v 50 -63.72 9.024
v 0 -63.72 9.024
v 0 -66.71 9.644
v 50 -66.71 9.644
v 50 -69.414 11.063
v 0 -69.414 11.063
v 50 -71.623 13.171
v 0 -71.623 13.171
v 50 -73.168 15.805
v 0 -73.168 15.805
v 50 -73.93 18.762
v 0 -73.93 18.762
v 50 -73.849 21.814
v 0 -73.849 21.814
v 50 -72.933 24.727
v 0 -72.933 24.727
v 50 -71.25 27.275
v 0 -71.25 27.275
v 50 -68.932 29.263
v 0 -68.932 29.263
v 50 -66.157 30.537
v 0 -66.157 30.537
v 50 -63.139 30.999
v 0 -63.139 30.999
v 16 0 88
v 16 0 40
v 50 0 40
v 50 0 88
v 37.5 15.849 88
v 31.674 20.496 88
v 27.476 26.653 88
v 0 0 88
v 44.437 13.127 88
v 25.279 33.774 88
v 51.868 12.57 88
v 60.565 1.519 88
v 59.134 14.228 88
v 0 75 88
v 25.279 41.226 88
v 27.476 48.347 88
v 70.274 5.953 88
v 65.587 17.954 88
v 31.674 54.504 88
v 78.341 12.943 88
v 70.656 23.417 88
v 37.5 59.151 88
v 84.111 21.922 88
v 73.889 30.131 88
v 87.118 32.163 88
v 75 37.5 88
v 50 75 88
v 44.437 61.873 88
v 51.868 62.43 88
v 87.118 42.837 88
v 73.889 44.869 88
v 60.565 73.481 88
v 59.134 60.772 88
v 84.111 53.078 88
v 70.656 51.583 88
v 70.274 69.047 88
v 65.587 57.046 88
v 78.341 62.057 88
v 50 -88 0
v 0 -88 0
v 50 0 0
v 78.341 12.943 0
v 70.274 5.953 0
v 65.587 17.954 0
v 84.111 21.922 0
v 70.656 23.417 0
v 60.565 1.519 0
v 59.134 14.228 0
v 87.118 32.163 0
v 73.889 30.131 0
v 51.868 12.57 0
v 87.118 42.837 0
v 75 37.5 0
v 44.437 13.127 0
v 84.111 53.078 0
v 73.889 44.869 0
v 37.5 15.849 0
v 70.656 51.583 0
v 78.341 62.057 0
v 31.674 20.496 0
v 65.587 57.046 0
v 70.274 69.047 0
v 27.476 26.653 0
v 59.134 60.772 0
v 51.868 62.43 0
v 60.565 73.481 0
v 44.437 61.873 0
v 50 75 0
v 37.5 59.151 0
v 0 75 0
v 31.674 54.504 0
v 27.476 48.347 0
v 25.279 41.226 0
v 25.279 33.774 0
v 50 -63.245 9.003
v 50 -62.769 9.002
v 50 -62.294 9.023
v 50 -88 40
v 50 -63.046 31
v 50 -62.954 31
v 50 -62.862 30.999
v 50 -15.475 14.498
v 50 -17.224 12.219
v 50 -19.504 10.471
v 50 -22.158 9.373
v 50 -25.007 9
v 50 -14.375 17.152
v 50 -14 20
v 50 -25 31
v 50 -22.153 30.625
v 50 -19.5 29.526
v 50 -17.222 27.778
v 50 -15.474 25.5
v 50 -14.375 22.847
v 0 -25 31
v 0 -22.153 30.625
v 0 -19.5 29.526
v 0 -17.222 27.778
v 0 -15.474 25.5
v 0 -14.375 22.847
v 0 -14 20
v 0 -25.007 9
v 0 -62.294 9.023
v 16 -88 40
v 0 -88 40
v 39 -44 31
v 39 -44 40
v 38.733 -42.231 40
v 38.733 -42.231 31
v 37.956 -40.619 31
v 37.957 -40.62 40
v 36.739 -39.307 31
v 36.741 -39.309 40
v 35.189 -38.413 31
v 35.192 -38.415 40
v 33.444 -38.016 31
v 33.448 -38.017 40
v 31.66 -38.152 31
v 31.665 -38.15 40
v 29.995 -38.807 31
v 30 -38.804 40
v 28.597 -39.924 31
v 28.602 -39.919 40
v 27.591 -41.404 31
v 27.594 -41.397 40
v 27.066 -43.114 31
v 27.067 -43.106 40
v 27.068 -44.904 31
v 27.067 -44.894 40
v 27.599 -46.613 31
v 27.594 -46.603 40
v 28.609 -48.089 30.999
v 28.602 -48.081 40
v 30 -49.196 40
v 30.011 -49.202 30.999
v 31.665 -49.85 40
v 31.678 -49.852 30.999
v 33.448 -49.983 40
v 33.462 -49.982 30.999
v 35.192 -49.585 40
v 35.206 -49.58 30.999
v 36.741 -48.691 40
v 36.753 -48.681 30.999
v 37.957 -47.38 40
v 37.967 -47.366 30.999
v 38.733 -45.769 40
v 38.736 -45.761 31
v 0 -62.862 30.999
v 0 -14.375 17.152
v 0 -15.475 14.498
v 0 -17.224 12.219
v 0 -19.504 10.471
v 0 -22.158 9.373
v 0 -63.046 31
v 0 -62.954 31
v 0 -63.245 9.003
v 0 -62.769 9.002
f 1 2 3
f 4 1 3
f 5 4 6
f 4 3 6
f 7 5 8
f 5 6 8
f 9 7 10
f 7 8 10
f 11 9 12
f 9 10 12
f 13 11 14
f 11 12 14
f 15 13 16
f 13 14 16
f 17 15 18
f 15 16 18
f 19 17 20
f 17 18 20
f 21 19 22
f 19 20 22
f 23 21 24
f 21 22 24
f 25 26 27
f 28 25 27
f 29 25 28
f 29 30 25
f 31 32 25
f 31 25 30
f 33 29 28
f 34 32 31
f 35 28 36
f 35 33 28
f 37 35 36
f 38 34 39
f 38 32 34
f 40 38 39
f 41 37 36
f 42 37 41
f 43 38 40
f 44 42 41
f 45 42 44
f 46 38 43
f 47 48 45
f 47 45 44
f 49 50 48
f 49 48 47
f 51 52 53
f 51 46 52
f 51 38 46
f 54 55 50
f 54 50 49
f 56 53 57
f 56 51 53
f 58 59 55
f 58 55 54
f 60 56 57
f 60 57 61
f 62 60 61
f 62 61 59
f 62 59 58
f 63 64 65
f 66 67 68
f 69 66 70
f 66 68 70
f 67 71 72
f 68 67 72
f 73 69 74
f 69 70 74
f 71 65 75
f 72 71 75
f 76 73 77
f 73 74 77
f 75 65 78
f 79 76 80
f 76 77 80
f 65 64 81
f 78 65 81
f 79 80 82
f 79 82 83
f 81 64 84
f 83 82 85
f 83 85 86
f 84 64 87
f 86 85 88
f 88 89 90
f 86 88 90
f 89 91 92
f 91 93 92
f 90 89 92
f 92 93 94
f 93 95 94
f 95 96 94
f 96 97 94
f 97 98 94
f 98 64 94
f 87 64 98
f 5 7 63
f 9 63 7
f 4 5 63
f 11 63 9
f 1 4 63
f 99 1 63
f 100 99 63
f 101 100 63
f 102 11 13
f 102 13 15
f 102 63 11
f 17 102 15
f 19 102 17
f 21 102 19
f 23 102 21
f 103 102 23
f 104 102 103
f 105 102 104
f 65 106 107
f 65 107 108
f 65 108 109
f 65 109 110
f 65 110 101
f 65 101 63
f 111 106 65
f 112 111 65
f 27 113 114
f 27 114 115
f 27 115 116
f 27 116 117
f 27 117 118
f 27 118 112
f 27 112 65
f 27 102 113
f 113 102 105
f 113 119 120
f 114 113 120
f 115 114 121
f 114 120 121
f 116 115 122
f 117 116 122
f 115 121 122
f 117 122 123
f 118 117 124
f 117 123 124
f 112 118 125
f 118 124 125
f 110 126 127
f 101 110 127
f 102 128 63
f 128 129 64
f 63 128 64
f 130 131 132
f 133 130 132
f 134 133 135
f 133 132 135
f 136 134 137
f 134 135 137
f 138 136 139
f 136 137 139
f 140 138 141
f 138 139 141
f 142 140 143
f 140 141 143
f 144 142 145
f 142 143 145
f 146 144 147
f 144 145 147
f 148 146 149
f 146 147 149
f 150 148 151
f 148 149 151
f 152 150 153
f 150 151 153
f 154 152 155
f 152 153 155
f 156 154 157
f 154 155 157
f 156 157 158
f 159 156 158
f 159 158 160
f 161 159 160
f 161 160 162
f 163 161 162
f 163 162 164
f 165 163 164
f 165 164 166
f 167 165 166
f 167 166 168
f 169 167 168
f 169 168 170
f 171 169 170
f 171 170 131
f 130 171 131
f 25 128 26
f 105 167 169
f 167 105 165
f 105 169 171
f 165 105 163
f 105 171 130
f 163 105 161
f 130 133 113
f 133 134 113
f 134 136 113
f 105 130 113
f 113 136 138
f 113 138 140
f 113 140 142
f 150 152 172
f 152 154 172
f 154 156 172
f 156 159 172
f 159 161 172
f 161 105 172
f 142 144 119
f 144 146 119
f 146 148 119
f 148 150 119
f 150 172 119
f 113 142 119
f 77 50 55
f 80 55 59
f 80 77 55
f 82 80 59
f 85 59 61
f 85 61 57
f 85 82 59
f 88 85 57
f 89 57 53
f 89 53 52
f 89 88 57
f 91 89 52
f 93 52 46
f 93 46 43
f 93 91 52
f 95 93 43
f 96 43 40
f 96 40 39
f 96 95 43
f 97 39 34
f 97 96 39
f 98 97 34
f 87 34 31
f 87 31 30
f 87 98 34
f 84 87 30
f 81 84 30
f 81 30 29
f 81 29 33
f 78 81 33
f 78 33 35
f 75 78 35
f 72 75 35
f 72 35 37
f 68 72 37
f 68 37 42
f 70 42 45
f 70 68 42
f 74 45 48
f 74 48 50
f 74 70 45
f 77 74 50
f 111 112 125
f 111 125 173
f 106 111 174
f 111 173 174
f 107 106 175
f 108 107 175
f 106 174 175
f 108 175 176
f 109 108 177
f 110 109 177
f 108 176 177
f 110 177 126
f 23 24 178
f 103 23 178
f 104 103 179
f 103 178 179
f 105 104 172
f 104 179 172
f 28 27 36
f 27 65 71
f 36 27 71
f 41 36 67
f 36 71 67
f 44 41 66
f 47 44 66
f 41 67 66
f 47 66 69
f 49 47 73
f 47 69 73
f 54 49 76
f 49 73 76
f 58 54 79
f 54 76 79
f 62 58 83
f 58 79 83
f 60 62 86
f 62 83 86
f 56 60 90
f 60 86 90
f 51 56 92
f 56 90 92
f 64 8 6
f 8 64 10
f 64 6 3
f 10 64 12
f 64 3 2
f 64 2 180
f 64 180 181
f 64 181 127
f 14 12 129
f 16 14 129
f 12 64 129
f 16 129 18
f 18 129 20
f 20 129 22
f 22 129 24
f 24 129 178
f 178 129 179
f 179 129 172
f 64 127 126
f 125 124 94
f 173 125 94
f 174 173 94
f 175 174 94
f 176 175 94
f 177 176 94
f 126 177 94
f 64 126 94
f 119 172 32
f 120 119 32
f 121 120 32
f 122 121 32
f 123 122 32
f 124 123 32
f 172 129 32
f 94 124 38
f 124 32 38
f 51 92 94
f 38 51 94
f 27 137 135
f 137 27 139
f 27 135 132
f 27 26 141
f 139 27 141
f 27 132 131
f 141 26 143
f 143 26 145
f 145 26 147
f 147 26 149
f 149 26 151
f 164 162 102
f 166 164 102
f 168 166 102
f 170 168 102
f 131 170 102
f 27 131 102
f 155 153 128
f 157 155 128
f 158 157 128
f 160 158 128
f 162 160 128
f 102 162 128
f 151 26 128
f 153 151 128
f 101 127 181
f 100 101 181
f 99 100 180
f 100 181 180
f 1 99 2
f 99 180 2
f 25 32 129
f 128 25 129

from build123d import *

# Parameters (mm, degrees)
F0_R     = 25
F1_DEPTH = 88
F3_DEPTH = 50
F5_DEPTH = 16
F6_R     = 6
F7_DEPTH = 9.001572688


with BuildPart() as f1:
    # F0 (on Top) → F1 (new body)
    with BuildSketch(Plane.XY):
        with BuildLine():
            Line((0, 75), (0, 0))
            Line((0, 0), (50, 0))
            ThreePointArc((50, 0), (12.5, 37.5), (50, 75))
            Line((50, 75), (0, 75))
        make_face()
        with BuildLine():
            ThreePointArc((50, 75), (12.5, 37.5), (50, 0))
            ThreePointArc((50, 0), (76.5165042945, 10.9834957055), (87.5, 37.5))
            ThreePointArc((87.5, 37.5), (76.5165042945, 64.0165042945), (50, 75))
        make_face()
        with Locations((50, 37.5)):
            Circle(F0_R, mode=Mode.SUBTRACT)
    extrude(amount=F1_DEPTH)

    # F2 (on Right) → F3 (join)
    with BuildSketch(Plane.YZ):
        Polygon((-88, 0), (0, 0), (0, 20), (0, 40), (-88, 40), align=None)
        with BuildLine():
            ThreePointArc((-25.000251984, 30.9999999971), (-17.2219144973, 27.7782636823), (-14, 20))
            ThreePointArc((-14, 20), (-17.2241933288, 12.2194582058), (-25.0066964749, 9.0000020383))
            Line((-25.0066964749, 9.0000020383), (-62.293662929, 9.0227012457))
            ThreePointArc((-62.293662929, 9.0227012457), (-63.0066964749, 9.0000020383), (-63.7197018551, 9.0235693762))
            ThreePointArc((-63.7197018551, 9.0235693762), (-73.9961566797, 20.2907546668), (-63.1386355855, 30.9991263369))
            ThreePointArc((-63.1386355855, 30.9991263369), (-63.000251984, 30.9999999971), (-62.8618683426, 30.999132677))
            Line((-62.8618683426, 30.999132677), (-25.000251984, 30.9999999971))
        make_face(mode=Mode.SUBTRACT)
    extrude(amount=F3_DEPTH)

    # F4 (on Right) → F5 (join)
    with BuildSketch(Plane.YZ):
        Polygon((-88, 40), (0, 40), (0, 88), align=None)
    extrude(amount=F5_DEPTH)

    # F6 (on face) → F7 (cut, through all)
    with BuildSketch(Plane.XY.offset(40)):
        with Locations((33, -44)):
            Circle(F6_R)
    extrude(amount=-F7_DEPTH, mode=Mode.SUBTRACT)


solid = f1.part
